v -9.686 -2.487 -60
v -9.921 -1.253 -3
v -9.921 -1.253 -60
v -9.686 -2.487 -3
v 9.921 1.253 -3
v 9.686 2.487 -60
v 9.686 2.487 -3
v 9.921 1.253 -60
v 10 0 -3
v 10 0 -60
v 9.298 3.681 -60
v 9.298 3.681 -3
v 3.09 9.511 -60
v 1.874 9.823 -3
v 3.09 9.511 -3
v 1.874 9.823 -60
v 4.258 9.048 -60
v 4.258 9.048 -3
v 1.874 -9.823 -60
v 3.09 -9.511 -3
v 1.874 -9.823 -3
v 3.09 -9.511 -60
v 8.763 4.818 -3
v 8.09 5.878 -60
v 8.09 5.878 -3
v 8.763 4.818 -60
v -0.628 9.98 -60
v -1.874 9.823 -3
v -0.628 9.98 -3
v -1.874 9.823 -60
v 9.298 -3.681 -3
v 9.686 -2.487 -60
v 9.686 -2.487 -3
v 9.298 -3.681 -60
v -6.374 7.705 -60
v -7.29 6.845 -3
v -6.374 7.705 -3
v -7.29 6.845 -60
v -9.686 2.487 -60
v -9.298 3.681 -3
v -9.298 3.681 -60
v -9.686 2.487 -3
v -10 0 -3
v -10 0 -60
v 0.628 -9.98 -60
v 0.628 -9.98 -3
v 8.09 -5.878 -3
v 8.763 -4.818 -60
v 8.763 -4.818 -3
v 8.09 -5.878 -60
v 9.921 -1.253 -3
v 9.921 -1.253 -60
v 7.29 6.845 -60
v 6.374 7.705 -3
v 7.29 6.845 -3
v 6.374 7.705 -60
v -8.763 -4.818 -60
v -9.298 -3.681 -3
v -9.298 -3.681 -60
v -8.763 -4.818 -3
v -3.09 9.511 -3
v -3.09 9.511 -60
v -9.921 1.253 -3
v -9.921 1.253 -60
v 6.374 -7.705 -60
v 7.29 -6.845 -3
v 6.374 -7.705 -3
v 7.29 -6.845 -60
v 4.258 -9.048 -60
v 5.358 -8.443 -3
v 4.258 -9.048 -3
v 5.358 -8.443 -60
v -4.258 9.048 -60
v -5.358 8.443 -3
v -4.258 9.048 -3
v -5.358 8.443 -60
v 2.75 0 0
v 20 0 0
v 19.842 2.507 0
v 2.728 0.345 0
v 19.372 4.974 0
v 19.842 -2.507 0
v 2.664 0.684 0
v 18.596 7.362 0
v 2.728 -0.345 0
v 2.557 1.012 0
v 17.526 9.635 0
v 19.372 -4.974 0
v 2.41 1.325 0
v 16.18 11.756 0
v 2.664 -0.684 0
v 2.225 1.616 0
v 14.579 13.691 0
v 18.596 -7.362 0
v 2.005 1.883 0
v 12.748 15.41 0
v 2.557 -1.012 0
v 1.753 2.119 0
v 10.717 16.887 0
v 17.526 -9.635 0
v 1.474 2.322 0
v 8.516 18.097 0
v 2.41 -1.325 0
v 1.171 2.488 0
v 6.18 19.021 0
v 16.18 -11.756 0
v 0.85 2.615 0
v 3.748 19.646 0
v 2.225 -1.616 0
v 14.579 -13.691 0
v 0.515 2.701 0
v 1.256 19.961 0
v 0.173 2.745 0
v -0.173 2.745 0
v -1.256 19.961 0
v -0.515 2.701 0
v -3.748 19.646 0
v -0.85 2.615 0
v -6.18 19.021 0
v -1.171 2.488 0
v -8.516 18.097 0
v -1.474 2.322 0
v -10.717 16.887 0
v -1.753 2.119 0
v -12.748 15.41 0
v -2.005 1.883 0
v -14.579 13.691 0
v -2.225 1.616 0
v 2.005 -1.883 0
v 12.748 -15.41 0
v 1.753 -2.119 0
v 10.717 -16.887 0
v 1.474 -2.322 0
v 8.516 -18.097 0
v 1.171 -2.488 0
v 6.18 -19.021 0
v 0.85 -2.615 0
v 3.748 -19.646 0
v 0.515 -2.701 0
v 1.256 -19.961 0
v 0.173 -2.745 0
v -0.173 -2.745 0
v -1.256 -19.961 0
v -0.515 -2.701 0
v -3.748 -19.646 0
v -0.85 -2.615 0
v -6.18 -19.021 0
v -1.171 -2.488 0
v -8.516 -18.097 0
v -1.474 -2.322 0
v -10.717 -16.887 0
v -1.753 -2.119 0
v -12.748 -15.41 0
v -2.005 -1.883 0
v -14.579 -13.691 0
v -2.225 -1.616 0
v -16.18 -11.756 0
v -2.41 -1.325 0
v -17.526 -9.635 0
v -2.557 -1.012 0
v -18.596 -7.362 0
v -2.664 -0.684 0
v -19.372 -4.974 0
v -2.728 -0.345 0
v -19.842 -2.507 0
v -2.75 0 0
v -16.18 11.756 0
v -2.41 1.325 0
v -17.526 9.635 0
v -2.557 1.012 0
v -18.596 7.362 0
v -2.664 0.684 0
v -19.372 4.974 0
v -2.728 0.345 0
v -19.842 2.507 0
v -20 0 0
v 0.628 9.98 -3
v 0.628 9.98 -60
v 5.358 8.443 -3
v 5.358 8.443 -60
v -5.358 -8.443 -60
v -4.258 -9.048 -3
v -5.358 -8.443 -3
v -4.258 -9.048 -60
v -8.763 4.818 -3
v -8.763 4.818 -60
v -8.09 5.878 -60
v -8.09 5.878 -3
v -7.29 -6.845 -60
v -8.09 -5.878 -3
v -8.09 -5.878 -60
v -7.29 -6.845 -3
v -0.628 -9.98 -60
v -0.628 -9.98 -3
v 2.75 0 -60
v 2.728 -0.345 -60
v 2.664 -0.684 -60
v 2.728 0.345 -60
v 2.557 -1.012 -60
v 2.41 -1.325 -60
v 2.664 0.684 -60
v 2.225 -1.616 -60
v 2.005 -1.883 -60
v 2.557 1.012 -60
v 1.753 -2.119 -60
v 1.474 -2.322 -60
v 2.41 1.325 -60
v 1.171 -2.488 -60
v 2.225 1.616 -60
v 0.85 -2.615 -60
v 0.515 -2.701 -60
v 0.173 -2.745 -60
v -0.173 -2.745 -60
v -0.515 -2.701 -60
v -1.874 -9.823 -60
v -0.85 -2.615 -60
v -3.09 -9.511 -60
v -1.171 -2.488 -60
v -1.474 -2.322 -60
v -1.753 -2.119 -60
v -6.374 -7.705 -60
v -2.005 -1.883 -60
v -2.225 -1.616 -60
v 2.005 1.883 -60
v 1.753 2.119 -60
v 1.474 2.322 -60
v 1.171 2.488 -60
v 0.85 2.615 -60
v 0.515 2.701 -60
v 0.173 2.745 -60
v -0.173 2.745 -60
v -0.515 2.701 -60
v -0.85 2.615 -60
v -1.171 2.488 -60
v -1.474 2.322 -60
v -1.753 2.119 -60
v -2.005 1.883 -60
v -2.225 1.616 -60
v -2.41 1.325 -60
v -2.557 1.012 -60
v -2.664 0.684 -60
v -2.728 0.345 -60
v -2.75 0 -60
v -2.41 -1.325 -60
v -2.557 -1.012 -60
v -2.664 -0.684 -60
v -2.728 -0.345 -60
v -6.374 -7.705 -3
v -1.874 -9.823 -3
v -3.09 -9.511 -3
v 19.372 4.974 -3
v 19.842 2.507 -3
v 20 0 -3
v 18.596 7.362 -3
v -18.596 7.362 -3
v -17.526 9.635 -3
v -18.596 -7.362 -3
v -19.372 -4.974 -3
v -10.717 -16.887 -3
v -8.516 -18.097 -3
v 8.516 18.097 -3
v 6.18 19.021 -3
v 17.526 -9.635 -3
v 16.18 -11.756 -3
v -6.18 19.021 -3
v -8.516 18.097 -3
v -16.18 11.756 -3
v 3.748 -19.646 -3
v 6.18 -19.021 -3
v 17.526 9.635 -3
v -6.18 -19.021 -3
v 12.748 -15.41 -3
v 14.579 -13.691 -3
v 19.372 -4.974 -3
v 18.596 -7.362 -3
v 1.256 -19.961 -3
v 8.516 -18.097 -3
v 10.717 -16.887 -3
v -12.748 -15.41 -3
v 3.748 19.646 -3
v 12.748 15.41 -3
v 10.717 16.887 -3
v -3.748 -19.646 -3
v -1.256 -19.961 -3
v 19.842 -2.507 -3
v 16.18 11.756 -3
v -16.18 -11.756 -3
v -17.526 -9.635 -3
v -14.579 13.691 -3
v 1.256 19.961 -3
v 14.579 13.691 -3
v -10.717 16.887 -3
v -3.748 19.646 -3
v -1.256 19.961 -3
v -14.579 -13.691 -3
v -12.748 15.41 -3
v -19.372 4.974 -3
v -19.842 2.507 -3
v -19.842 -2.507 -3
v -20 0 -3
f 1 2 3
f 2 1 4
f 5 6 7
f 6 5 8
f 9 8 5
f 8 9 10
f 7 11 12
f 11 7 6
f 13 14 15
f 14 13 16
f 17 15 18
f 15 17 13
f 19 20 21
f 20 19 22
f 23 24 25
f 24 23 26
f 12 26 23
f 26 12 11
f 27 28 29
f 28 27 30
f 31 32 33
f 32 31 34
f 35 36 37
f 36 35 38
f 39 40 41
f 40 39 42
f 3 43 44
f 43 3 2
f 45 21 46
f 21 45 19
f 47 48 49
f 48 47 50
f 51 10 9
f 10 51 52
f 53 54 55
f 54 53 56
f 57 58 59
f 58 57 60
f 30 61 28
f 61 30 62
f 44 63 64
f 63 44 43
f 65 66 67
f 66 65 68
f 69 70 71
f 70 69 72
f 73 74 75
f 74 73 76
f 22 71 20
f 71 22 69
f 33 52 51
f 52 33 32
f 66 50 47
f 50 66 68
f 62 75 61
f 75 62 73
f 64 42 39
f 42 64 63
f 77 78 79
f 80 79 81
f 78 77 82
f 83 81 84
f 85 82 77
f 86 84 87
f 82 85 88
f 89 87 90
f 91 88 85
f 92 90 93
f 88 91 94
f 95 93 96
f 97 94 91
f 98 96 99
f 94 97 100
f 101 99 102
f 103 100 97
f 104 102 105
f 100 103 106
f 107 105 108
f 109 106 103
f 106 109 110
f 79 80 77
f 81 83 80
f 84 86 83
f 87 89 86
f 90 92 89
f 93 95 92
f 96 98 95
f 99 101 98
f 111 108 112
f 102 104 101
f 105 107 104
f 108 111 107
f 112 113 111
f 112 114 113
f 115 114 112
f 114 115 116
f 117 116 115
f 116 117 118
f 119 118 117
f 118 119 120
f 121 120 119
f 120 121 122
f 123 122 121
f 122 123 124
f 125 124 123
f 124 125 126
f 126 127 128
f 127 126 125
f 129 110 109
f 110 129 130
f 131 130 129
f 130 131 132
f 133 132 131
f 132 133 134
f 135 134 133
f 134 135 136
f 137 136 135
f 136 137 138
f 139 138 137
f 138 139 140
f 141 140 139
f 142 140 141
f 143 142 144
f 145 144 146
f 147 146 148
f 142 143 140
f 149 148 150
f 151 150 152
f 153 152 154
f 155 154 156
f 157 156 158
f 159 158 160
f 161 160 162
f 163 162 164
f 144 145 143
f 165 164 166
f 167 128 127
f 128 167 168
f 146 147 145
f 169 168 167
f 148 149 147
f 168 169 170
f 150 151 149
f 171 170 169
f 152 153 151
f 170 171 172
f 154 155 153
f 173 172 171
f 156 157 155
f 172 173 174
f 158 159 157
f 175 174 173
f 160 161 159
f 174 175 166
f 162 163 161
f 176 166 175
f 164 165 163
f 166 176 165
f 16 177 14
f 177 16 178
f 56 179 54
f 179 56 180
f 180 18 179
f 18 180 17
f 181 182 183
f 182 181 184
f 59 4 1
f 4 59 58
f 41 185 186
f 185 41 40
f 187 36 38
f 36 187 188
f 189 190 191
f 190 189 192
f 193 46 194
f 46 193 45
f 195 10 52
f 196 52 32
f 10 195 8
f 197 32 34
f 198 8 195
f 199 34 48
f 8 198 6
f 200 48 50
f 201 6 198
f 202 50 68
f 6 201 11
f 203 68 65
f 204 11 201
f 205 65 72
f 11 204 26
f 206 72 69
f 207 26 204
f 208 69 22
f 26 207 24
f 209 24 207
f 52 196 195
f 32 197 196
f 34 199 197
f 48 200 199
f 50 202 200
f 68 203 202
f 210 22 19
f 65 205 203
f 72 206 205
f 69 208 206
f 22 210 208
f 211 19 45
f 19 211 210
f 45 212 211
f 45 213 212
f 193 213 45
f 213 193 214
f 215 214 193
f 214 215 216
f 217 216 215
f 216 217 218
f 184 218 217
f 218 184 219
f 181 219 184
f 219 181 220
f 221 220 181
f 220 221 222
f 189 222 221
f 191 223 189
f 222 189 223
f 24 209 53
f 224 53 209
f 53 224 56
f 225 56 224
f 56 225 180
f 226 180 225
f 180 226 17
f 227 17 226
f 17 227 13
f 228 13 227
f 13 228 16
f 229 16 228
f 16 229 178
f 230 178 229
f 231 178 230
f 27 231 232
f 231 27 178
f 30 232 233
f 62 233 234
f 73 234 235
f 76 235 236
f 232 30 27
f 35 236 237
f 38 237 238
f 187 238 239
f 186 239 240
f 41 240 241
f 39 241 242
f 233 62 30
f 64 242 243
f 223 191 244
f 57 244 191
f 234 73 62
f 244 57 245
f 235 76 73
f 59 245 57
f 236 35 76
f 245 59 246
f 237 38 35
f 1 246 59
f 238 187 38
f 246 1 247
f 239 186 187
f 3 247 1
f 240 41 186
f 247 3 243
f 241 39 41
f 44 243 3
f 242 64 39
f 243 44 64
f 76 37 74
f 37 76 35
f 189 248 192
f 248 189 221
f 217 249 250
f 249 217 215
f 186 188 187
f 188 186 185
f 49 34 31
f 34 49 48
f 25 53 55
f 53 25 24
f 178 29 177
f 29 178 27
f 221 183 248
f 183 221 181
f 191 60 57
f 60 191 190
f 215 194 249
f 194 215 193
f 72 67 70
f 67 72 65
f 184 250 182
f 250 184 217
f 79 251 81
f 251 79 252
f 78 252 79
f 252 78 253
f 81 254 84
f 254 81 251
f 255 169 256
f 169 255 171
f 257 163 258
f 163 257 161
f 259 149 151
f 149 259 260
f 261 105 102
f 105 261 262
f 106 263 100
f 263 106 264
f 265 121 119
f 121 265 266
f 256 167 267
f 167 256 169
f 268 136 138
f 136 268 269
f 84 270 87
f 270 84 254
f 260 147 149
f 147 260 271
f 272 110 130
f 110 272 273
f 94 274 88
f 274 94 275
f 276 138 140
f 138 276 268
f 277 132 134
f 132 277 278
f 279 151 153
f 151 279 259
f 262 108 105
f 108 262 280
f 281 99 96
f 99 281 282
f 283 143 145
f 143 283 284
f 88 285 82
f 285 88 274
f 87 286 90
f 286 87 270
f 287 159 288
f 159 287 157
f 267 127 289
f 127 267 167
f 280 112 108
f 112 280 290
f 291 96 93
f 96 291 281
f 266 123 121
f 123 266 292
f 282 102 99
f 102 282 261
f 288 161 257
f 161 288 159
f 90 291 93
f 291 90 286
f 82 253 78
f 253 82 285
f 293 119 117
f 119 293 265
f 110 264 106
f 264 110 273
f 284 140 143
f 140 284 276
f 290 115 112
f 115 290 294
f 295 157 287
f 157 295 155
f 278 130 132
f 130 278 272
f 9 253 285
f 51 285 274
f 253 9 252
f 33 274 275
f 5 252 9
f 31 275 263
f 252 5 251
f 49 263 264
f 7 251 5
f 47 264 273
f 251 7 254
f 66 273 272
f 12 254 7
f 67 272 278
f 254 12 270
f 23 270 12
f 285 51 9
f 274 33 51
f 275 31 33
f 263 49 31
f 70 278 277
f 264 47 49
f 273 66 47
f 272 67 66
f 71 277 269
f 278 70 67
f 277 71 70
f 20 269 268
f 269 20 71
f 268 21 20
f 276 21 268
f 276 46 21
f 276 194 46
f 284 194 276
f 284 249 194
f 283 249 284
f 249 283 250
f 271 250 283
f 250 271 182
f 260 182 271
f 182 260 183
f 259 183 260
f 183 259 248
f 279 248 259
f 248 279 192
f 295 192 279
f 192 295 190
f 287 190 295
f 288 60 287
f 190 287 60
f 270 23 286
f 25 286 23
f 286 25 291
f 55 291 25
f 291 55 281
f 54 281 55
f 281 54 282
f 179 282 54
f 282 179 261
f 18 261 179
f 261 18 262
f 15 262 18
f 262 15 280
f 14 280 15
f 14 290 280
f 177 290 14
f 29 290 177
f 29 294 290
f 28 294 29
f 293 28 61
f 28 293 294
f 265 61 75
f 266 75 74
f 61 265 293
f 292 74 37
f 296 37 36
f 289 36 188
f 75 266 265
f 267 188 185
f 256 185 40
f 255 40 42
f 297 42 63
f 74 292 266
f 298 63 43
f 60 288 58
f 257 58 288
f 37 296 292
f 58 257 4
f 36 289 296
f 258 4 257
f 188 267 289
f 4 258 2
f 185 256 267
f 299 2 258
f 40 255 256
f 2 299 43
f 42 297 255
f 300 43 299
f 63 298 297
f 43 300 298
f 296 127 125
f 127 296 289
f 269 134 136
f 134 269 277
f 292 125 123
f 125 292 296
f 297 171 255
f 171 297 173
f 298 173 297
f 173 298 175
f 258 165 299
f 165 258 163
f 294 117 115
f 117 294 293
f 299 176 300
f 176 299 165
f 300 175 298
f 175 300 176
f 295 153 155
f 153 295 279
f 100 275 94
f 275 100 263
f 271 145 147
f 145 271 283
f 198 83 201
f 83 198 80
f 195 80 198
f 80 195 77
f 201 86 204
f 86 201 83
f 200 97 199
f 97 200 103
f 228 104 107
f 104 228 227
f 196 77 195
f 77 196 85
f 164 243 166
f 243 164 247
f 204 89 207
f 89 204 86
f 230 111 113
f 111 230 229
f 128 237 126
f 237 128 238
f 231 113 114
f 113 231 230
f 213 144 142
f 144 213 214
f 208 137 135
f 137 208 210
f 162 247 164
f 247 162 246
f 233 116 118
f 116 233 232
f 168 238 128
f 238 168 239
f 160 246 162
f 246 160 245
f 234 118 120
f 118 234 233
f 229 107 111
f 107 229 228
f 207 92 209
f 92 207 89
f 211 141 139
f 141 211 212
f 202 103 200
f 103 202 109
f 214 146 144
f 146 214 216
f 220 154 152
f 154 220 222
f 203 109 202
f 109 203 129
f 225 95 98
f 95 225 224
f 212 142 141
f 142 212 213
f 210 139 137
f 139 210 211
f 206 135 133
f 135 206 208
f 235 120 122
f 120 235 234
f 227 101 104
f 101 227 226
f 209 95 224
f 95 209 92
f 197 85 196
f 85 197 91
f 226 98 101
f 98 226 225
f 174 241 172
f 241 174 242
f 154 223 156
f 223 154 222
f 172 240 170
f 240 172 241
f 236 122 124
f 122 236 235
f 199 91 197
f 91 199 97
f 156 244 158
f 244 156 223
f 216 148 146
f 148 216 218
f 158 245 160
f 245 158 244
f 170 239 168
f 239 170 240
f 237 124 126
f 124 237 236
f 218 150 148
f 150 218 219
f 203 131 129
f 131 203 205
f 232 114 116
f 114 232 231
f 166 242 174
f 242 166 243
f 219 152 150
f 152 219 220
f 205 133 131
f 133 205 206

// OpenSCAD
$fn = 50;


difference() {
	union() {
		translate(v = [0, 0, -60.0000000000]) {
			cylinder(h = 60, r = 10.0000000000);
		}
		translate(v = [0, 0, -3.0000000000]) {
			cylinder(h = 3, r = 20.0000000000);
		}
	}
	union() {
		#translate(v = [0, 0, -60]) {
			cylinder(h = 60, r = 2.7500000000);
		}
	}
}
